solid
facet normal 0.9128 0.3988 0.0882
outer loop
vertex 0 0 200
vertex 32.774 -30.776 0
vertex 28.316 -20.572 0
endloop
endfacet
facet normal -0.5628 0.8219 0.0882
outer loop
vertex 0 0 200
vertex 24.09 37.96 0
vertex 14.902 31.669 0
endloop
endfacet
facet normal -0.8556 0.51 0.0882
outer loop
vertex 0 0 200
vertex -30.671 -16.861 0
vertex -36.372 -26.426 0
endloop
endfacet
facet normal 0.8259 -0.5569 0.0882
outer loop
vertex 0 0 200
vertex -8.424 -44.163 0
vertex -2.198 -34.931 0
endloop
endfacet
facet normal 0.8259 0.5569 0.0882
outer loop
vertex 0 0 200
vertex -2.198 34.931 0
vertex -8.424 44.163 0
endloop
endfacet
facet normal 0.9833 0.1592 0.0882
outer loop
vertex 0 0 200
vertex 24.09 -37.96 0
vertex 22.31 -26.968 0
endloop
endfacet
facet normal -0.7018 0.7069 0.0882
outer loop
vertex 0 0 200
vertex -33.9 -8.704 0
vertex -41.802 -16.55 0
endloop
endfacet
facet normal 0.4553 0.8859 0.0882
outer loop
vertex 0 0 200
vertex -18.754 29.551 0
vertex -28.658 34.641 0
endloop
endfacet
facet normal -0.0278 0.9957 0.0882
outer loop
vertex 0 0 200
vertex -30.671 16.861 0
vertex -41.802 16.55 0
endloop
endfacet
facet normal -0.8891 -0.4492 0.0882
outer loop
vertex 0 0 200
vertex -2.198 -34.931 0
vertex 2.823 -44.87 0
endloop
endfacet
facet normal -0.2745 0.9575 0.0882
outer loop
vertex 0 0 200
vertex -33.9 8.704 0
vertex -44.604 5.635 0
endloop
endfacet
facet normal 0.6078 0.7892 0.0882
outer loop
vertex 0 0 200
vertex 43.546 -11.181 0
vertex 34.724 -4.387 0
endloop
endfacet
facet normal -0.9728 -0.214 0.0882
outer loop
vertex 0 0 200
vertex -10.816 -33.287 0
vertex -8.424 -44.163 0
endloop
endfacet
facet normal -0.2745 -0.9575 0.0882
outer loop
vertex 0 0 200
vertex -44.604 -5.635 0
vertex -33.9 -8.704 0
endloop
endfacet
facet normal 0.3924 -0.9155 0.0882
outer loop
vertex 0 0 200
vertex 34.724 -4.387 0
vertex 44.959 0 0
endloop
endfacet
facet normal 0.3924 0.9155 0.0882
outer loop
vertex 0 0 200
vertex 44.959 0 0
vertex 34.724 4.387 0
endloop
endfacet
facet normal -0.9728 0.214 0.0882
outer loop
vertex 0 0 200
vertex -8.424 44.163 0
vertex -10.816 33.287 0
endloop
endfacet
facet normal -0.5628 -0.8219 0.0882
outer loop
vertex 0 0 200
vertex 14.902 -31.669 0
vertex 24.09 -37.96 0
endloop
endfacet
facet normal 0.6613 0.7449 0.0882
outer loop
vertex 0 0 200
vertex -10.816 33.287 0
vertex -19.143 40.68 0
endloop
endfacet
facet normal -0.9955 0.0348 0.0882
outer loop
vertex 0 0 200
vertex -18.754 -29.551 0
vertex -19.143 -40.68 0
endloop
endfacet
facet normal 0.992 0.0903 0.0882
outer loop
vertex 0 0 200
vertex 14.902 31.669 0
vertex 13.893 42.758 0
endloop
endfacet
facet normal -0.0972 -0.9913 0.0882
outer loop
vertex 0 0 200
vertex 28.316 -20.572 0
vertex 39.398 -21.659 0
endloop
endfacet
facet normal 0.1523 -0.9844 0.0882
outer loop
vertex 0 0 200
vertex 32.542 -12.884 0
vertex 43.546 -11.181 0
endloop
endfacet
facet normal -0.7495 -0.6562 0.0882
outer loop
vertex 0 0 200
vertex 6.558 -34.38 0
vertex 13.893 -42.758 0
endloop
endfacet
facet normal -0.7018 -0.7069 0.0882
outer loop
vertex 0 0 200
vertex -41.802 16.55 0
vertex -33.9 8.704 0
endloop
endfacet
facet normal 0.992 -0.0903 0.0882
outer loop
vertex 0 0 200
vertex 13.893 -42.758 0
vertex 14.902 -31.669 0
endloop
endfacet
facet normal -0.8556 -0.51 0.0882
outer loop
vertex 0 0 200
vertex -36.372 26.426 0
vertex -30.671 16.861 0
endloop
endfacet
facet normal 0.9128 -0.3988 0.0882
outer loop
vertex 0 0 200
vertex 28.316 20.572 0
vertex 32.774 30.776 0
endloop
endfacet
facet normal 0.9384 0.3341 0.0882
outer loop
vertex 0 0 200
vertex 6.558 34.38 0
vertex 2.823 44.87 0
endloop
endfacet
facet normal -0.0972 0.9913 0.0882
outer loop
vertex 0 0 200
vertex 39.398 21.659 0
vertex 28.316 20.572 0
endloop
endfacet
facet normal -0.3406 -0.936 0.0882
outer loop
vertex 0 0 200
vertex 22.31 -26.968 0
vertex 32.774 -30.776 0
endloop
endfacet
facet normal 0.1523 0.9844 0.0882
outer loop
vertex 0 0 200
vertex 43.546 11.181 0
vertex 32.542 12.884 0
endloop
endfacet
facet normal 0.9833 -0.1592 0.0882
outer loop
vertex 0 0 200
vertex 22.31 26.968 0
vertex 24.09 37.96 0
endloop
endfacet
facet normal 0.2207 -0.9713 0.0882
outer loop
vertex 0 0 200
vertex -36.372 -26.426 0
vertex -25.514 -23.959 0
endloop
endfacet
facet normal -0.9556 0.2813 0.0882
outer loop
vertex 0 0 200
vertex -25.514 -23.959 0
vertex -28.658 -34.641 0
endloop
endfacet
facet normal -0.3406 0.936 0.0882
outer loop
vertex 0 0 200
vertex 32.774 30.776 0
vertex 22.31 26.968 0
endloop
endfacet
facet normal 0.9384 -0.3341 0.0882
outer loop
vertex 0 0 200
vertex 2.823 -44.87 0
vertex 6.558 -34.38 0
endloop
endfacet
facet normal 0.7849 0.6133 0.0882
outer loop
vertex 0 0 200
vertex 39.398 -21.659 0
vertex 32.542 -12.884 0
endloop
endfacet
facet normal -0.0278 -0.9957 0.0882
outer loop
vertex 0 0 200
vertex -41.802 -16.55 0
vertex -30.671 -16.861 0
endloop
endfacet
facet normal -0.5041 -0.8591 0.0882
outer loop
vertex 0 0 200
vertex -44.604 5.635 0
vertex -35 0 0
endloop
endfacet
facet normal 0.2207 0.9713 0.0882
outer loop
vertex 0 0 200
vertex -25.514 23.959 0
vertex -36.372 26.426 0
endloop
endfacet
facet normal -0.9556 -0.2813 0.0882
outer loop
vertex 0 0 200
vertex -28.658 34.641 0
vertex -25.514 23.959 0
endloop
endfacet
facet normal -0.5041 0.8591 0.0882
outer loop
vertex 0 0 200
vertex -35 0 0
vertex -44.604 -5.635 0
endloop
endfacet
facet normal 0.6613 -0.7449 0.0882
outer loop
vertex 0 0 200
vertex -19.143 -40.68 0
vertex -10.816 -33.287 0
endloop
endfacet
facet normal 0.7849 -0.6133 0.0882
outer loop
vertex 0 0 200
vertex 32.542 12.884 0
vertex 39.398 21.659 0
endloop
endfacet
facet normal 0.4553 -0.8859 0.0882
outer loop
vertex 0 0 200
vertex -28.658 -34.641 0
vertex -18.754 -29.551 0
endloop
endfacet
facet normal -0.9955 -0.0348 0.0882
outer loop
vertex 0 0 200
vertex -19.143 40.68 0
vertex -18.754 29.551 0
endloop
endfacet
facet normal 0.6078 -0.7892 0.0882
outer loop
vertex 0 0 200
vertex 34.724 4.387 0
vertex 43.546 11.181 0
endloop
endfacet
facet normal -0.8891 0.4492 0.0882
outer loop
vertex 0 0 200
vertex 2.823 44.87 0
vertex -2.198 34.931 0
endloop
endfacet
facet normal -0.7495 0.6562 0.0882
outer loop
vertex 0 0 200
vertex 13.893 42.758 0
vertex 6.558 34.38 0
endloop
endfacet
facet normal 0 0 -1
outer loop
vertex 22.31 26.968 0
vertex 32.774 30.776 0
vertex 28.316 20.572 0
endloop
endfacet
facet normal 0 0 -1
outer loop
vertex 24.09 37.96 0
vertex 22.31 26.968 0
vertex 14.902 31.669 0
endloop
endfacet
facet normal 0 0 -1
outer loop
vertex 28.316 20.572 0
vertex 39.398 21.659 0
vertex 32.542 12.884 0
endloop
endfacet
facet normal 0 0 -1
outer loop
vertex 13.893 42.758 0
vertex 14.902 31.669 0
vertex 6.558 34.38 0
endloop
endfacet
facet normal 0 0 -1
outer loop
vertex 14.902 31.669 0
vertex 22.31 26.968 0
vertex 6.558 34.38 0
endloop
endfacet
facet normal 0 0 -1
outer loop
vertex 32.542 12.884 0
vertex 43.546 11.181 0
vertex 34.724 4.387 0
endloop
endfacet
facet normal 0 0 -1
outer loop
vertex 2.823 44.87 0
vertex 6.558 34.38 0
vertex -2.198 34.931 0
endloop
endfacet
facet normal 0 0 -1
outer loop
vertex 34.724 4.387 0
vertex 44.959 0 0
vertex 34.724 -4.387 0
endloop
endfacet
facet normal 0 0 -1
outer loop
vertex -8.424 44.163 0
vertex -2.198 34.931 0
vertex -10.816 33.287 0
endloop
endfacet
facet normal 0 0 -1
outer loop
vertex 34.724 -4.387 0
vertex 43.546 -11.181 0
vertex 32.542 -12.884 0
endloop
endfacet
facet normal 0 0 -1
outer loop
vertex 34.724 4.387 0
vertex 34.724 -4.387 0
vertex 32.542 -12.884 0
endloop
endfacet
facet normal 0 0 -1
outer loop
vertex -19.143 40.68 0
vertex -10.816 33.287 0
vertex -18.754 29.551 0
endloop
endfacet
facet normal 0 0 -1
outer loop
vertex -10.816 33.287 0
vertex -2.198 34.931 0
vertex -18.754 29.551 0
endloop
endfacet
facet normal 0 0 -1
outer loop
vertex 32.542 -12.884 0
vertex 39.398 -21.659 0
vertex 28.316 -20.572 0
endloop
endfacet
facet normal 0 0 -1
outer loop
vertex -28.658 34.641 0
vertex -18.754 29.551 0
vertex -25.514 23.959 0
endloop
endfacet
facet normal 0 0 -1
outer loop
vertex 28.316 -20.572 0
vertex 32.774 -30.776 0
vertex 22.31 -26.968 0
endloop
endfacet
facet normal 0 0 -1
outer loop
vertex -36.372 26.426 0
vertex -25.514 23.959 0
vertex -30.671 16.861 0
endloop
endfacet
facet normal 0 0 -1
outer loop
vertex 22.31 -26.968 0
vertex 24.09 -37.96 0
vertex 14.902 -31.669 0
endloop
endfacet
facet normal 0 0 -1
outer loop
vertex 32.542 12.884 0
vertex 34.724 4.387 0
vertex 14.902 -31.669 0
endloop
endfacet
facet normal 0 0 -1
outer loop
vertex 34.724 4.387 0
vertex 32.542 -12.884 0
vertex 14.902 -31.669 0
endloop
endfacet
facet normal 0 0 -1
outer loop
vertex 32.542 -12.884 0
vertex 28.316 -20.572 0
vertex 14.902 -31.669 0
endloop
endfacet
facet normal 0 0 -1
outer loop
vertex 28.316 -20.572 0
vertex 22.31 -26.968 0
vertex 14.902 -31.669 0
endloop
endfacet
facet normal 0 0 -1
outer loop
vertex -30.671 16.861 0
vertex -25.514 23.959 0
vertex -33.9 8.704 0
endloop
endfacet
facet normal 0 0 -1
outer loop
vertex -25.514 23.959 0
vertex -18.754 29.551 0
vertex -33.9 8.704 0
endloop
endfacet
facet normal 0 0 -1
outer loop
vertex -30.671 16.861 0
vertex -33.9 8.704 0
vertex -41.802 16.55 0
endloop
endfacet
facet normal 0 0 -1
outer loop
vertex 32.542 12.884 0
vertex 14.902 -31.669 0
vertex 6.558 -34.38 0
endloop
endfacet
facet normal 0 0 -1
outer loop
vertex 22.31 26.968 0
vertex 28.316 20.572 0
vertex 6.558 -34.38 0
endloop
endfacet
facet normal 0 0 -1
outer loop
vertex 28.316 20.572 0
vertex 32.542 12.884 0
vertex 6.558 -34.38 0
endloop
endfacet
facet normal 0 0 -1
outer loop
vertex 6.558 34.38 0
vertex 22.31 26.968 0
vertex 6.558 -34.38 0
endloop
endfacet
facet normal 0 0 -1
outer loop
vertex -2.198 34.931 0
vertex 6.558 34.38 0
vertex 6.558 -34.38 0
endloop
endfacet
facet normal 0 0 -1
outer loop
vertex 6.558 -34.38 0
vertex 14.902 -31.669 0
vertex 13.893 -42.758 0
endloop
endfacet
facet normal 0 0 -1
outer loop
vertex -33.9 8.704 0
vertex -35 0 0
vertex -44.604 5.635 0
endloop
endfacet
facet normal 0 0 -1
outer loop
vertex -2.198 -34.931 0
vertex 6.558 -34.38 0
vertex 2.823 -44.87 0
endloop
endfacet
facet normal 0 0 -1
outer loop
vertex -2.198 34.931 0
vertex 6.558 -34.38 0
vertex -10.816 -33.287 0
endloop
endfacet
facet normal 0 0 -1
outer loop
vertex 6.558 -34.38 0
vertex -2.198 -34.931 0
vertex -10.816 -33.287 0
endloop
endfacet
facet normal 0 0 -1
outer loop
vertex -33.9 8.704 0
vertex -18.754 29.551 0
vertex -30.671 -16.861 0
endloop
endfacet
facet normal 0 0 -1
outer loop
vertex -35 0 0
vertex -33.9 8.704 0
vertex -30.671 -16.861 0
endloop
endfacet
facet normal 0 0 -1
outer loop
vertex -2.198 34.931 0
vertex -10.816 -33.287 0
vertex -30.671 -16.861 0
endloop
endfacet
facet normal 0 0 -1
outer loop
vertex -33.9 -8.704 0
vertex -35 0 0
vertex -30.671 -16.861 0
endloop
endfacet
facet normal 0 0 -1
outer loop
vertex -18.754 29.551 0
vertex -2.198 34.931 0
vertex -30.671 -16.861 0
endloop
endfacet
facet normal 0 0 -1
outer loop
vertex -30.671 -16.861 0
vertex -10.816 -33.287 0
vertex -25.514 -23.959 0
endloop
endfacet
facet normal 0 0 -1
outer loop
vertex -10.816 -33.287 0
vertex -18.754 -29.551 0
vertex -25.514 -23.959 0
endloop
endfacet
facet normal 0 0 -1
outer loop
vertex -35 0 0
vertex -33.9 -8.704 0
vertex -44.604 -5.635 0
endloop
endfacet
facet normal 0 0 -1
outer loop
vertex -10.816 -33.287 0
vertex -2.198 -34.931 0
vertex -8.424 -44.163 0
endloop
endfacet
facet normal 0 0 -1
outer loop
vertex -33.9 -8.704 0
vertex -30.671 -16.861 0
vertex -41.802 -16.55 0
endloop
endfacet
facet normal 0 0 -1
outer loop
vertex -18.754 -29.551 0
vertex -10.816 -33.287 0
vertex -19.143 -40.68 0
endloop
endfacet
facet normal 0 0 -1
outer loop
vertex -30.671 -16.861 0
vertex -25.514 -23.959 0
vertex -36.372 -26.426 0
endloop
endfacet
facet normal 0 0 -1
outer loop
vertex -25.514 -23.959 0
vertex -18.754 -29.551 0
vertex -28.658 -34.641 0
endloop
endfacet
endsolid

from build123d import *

# Parameters (mm, degrees)
F8_COUNT = 25


with BuildPart() as f1:
    # F0 (on Front) → F1 (revolve)
    with BuildSketch(Plane.XZ):
        Polygon((-45, 0), (0, 0), (0, 200), align=None)
    revolve(axis=Axis((0, 0, 100), (0, 0, 1)))


with BuildPart() as f7:
    # F7: sweep along a path in F6
    with BuildLine(Plane.XZ) as f7_path:
        Line((-35, 0), (2.9236729855, 216.7067027743))
    # F5 (on face) → F7 (sweep)
    with BuildSketch(Plane(origin=(0, 0, 0), x_dir=(1, 0, 0), z_dir=(0, 0, -1))):
        with BuildLine():
            Line((-44.6429487171, -5.6574844095), (-35, 0))
            Line((-35, 0), (-44.6429487171, 5.6574844095))
            ThreePointArc((-44.6429487171, 5.6574844095), (-45, 0), (-44.6429487171, -5.6574844095))
        make_face()
    sweep(path=f7_path.line)


with BuildPart() as f8_1:
    # F8: instance of F7
    add(f7.part.rotate(Axis((0, 0, 0), (0, 0, 1)), 1 * 360 / F8_COUNT))


with BuildPart() as f8_2:
    # F8: instance of F7
    add(f7.part.rotate(Axis((0, 0, 0), (0, 0, 1)), 2 * 360 / F8_COUNT))


with BuildPart() as f8_3:
    # F8: instance of F7
    add(f7.part.rotate(Axis((0, 0, 0), (0, 0, 1)), 3 * 360 / F8_COUNT))


with BuildPart() as f8_4:
    # F8: instance of F7
    add(f7.part.rotate(Axis((0, 0, 0), (0, 0, 1)), 4 * 360 / F8_COUNT))


with BuildPart() as f8_5:
    # F8: instance of F7
    add(f7.part.rotate(Axis((0, 0, 0), (0, 0, 1)), 5 * 360 / F8_COUNT))


with BuildPart() as f8_6:
    # F8: instance of F7
    add(f7.part.rotate(Axis((0, 0, 0), (0, 0, 1)), 6 * 360 / F8_COUNT))


with BuildPart() as f8_7:
    # F8: instance of F7
    add(f7.part.rotate(Axis((0, 0, 0), (0, 0, 1)), 7 * 360 / F8_COUNT))


with BuildPart() as f8_8:
    # F8: instance of F7
    add(f7.part.rotate(Axis((0, 0, 0), (0, 0, 1)), 8 * 360 / F8_COUNT))


with BuildPart() as f8_9:
    # F8: instance of F7
    add(f7.part.rotate(Axis((0, 0, 0), (0, 0, 1)), 9 * 360 / F8_COUNT))


with BuildPart() as f8_10:
    # F8: instance of F7
    add(f7.part.rotate(Axis((0, 0, 0), (0, 0, 1)), 10 * 360 / F8_COUNT))


with BuildPart() as f8_11:
    # F8: instance of F7
    add(f7.part.rotate(Axis((0, 0, 0), (0, 0, 1)), 11 * 360 / F8_COUNT))


with BuildPart() as f8_12:
    # F8: instance of F7
    add(f7.part.rotate(Axis((0, 0, 0), (0, 0, 1)), 12 * 360 / F8_COUNT))


with BuildPart() as f8_13:
    # F8: instance of F7
    add(f7.part.rotate(Axis((0, 0, 0), (0, 0, 1)), 13 * 360 / F8_COUNT))


with BuildPart() as f8_14:
    # F8: instance of F7
    add(f7.part.rotate(Axis((0, 0, 0), (0, 0, 1)), 14 * 360 / F8_COUNT))


with BuildPart() as f8_15:
    # F8: instance of F7
    add(f7.part.rotate(Axis((0, 0, 0), (0, 0, 1)), 15 * 360 / F8_COUNT))


with BuildPart() as f8_16:
    # F8: instance of F7
    add(f7.part.rotate(Axis((0, 0, 0), (0, 0, 1)), 16 * 360 / F8_COUNT))


with BuildPart() as f8_17:
    # F8: instance of F7
    add(f7.part.rotate(Axis((0, 0, 0), (0, 0, 1)), 17 * 360 / F8_COUNT))


with BuildPart() as f8_18:
    # F8: instance of F7
    add(f7.part.rotate(Axis((0, 0, 0), (0, 0, 1)), 18 * 360 / F8_COUNT))


with BuildPart() as f8_19:
    # F8: instance of F7
    add(f7.part.rotate(Axis((0, 0, 0), (0, 0, 1)), 19 * 360 / F8_COUNT))


with BuildPart() as f8_20:
    # F8: instance of F7
    add(f7.part.rotate(Axis((0, 0, 0), (0, 0, 1)), 20 * 360 / F8_COUNT))


with BuildPart() as f8_21:
    # F8: instance of F7
    add(f7.part.rotate(Axis((0, 0, 0), (0, 0, 1)), 21 * 360 / F8_COUNT))


with BuildPart() as f8_22:
    # F8: instance of F7
    add(f7.part.rotate(Axis((0, 0, 0), (0, 0, 1)), 22 * 360 / F8_COUNT))


with BuildPart() as f8_23:
    # F8: instance of F7
    add(f7.part.rotate(Axis((0, 0, 0), (0, 0, 1)), 23 * 360 / F8_COUNT))


with BuildPart() as f8_24:
    # F8: instance of F7
    add(f7.part.rotate(Axis((0, 0, 0), (0, 0, 1)), 24 * 360 / F8_COUNT))


with BuildPart() as f1_1:
    add(f1.part)

    # F9: cut F7, F8_1, F8_2, F8_3, F8_6, F8_7, F8_8, F8_9, F8_10, F8_11, F8_12, F8_13, F8_14, F8_15, F8_16, F8_17, F8_18, F8_19, F8_20, F8_21, F8_22, F8_23, F8_24, F8_4, F8_5
    add(f7.part, mode=Mode.SUBTRACT)
    add(f8_1.part, mode=Mode.SUBTRACT)
    add(f8_2.part, mode=Mode.SUBTRACT)
    add(f8_3.part, mode=Mode.SUBTRACT)
    add(f8_6.part, mode=Mode.SUBTRACT)
    add(f8_7.part, mode=Mode.SUBTRACT)
    add(f8_8.part, mode=Mode.SUBTRACT)
    add(f8_9.part, mode=Mode.SUBTRACT)
    add(f8_10.part, mode=Mode.SUBTRACT)
    add(f8_11.part, mode=Mode.SUBTRACT)
    add(f8_12.part, mode=Mode.SUBTRACT)
    add(f8_13.part, mode=Mode.SUBTRACT)
    add(f8_14.part, mode=Mode.SUBTRACT)
    add(f8_15.part, mode=Mode.SUBTRACT)
    add(f8_16.part, mode=Mode.SUBTRACT)
    add(f8_17.part, mode=Mode.SUBTRACT)
    add(f8_18.part, mode=Mode.SUBTRACT)
    add(f8_19.part, mode=Mode.SUBTRACT)
    add(f8_20.part, mode=Mode.SUBTRACT)
    add(f8_21.part, mode=Mode.SUBTRACT)
    add(f8_22.part, mode=Mode.SUBTRACT)
    add(f8_23.part, mode=Mode.SUBTRACT)
    add(f8_24.part, mode=Mode.SUBTRACT)
    add(f8_4.part, mode=Mode.SUBTRACT)
    add(f8_5.part, mode=Mode.SUBTRACT)


solid = f1_1.part
